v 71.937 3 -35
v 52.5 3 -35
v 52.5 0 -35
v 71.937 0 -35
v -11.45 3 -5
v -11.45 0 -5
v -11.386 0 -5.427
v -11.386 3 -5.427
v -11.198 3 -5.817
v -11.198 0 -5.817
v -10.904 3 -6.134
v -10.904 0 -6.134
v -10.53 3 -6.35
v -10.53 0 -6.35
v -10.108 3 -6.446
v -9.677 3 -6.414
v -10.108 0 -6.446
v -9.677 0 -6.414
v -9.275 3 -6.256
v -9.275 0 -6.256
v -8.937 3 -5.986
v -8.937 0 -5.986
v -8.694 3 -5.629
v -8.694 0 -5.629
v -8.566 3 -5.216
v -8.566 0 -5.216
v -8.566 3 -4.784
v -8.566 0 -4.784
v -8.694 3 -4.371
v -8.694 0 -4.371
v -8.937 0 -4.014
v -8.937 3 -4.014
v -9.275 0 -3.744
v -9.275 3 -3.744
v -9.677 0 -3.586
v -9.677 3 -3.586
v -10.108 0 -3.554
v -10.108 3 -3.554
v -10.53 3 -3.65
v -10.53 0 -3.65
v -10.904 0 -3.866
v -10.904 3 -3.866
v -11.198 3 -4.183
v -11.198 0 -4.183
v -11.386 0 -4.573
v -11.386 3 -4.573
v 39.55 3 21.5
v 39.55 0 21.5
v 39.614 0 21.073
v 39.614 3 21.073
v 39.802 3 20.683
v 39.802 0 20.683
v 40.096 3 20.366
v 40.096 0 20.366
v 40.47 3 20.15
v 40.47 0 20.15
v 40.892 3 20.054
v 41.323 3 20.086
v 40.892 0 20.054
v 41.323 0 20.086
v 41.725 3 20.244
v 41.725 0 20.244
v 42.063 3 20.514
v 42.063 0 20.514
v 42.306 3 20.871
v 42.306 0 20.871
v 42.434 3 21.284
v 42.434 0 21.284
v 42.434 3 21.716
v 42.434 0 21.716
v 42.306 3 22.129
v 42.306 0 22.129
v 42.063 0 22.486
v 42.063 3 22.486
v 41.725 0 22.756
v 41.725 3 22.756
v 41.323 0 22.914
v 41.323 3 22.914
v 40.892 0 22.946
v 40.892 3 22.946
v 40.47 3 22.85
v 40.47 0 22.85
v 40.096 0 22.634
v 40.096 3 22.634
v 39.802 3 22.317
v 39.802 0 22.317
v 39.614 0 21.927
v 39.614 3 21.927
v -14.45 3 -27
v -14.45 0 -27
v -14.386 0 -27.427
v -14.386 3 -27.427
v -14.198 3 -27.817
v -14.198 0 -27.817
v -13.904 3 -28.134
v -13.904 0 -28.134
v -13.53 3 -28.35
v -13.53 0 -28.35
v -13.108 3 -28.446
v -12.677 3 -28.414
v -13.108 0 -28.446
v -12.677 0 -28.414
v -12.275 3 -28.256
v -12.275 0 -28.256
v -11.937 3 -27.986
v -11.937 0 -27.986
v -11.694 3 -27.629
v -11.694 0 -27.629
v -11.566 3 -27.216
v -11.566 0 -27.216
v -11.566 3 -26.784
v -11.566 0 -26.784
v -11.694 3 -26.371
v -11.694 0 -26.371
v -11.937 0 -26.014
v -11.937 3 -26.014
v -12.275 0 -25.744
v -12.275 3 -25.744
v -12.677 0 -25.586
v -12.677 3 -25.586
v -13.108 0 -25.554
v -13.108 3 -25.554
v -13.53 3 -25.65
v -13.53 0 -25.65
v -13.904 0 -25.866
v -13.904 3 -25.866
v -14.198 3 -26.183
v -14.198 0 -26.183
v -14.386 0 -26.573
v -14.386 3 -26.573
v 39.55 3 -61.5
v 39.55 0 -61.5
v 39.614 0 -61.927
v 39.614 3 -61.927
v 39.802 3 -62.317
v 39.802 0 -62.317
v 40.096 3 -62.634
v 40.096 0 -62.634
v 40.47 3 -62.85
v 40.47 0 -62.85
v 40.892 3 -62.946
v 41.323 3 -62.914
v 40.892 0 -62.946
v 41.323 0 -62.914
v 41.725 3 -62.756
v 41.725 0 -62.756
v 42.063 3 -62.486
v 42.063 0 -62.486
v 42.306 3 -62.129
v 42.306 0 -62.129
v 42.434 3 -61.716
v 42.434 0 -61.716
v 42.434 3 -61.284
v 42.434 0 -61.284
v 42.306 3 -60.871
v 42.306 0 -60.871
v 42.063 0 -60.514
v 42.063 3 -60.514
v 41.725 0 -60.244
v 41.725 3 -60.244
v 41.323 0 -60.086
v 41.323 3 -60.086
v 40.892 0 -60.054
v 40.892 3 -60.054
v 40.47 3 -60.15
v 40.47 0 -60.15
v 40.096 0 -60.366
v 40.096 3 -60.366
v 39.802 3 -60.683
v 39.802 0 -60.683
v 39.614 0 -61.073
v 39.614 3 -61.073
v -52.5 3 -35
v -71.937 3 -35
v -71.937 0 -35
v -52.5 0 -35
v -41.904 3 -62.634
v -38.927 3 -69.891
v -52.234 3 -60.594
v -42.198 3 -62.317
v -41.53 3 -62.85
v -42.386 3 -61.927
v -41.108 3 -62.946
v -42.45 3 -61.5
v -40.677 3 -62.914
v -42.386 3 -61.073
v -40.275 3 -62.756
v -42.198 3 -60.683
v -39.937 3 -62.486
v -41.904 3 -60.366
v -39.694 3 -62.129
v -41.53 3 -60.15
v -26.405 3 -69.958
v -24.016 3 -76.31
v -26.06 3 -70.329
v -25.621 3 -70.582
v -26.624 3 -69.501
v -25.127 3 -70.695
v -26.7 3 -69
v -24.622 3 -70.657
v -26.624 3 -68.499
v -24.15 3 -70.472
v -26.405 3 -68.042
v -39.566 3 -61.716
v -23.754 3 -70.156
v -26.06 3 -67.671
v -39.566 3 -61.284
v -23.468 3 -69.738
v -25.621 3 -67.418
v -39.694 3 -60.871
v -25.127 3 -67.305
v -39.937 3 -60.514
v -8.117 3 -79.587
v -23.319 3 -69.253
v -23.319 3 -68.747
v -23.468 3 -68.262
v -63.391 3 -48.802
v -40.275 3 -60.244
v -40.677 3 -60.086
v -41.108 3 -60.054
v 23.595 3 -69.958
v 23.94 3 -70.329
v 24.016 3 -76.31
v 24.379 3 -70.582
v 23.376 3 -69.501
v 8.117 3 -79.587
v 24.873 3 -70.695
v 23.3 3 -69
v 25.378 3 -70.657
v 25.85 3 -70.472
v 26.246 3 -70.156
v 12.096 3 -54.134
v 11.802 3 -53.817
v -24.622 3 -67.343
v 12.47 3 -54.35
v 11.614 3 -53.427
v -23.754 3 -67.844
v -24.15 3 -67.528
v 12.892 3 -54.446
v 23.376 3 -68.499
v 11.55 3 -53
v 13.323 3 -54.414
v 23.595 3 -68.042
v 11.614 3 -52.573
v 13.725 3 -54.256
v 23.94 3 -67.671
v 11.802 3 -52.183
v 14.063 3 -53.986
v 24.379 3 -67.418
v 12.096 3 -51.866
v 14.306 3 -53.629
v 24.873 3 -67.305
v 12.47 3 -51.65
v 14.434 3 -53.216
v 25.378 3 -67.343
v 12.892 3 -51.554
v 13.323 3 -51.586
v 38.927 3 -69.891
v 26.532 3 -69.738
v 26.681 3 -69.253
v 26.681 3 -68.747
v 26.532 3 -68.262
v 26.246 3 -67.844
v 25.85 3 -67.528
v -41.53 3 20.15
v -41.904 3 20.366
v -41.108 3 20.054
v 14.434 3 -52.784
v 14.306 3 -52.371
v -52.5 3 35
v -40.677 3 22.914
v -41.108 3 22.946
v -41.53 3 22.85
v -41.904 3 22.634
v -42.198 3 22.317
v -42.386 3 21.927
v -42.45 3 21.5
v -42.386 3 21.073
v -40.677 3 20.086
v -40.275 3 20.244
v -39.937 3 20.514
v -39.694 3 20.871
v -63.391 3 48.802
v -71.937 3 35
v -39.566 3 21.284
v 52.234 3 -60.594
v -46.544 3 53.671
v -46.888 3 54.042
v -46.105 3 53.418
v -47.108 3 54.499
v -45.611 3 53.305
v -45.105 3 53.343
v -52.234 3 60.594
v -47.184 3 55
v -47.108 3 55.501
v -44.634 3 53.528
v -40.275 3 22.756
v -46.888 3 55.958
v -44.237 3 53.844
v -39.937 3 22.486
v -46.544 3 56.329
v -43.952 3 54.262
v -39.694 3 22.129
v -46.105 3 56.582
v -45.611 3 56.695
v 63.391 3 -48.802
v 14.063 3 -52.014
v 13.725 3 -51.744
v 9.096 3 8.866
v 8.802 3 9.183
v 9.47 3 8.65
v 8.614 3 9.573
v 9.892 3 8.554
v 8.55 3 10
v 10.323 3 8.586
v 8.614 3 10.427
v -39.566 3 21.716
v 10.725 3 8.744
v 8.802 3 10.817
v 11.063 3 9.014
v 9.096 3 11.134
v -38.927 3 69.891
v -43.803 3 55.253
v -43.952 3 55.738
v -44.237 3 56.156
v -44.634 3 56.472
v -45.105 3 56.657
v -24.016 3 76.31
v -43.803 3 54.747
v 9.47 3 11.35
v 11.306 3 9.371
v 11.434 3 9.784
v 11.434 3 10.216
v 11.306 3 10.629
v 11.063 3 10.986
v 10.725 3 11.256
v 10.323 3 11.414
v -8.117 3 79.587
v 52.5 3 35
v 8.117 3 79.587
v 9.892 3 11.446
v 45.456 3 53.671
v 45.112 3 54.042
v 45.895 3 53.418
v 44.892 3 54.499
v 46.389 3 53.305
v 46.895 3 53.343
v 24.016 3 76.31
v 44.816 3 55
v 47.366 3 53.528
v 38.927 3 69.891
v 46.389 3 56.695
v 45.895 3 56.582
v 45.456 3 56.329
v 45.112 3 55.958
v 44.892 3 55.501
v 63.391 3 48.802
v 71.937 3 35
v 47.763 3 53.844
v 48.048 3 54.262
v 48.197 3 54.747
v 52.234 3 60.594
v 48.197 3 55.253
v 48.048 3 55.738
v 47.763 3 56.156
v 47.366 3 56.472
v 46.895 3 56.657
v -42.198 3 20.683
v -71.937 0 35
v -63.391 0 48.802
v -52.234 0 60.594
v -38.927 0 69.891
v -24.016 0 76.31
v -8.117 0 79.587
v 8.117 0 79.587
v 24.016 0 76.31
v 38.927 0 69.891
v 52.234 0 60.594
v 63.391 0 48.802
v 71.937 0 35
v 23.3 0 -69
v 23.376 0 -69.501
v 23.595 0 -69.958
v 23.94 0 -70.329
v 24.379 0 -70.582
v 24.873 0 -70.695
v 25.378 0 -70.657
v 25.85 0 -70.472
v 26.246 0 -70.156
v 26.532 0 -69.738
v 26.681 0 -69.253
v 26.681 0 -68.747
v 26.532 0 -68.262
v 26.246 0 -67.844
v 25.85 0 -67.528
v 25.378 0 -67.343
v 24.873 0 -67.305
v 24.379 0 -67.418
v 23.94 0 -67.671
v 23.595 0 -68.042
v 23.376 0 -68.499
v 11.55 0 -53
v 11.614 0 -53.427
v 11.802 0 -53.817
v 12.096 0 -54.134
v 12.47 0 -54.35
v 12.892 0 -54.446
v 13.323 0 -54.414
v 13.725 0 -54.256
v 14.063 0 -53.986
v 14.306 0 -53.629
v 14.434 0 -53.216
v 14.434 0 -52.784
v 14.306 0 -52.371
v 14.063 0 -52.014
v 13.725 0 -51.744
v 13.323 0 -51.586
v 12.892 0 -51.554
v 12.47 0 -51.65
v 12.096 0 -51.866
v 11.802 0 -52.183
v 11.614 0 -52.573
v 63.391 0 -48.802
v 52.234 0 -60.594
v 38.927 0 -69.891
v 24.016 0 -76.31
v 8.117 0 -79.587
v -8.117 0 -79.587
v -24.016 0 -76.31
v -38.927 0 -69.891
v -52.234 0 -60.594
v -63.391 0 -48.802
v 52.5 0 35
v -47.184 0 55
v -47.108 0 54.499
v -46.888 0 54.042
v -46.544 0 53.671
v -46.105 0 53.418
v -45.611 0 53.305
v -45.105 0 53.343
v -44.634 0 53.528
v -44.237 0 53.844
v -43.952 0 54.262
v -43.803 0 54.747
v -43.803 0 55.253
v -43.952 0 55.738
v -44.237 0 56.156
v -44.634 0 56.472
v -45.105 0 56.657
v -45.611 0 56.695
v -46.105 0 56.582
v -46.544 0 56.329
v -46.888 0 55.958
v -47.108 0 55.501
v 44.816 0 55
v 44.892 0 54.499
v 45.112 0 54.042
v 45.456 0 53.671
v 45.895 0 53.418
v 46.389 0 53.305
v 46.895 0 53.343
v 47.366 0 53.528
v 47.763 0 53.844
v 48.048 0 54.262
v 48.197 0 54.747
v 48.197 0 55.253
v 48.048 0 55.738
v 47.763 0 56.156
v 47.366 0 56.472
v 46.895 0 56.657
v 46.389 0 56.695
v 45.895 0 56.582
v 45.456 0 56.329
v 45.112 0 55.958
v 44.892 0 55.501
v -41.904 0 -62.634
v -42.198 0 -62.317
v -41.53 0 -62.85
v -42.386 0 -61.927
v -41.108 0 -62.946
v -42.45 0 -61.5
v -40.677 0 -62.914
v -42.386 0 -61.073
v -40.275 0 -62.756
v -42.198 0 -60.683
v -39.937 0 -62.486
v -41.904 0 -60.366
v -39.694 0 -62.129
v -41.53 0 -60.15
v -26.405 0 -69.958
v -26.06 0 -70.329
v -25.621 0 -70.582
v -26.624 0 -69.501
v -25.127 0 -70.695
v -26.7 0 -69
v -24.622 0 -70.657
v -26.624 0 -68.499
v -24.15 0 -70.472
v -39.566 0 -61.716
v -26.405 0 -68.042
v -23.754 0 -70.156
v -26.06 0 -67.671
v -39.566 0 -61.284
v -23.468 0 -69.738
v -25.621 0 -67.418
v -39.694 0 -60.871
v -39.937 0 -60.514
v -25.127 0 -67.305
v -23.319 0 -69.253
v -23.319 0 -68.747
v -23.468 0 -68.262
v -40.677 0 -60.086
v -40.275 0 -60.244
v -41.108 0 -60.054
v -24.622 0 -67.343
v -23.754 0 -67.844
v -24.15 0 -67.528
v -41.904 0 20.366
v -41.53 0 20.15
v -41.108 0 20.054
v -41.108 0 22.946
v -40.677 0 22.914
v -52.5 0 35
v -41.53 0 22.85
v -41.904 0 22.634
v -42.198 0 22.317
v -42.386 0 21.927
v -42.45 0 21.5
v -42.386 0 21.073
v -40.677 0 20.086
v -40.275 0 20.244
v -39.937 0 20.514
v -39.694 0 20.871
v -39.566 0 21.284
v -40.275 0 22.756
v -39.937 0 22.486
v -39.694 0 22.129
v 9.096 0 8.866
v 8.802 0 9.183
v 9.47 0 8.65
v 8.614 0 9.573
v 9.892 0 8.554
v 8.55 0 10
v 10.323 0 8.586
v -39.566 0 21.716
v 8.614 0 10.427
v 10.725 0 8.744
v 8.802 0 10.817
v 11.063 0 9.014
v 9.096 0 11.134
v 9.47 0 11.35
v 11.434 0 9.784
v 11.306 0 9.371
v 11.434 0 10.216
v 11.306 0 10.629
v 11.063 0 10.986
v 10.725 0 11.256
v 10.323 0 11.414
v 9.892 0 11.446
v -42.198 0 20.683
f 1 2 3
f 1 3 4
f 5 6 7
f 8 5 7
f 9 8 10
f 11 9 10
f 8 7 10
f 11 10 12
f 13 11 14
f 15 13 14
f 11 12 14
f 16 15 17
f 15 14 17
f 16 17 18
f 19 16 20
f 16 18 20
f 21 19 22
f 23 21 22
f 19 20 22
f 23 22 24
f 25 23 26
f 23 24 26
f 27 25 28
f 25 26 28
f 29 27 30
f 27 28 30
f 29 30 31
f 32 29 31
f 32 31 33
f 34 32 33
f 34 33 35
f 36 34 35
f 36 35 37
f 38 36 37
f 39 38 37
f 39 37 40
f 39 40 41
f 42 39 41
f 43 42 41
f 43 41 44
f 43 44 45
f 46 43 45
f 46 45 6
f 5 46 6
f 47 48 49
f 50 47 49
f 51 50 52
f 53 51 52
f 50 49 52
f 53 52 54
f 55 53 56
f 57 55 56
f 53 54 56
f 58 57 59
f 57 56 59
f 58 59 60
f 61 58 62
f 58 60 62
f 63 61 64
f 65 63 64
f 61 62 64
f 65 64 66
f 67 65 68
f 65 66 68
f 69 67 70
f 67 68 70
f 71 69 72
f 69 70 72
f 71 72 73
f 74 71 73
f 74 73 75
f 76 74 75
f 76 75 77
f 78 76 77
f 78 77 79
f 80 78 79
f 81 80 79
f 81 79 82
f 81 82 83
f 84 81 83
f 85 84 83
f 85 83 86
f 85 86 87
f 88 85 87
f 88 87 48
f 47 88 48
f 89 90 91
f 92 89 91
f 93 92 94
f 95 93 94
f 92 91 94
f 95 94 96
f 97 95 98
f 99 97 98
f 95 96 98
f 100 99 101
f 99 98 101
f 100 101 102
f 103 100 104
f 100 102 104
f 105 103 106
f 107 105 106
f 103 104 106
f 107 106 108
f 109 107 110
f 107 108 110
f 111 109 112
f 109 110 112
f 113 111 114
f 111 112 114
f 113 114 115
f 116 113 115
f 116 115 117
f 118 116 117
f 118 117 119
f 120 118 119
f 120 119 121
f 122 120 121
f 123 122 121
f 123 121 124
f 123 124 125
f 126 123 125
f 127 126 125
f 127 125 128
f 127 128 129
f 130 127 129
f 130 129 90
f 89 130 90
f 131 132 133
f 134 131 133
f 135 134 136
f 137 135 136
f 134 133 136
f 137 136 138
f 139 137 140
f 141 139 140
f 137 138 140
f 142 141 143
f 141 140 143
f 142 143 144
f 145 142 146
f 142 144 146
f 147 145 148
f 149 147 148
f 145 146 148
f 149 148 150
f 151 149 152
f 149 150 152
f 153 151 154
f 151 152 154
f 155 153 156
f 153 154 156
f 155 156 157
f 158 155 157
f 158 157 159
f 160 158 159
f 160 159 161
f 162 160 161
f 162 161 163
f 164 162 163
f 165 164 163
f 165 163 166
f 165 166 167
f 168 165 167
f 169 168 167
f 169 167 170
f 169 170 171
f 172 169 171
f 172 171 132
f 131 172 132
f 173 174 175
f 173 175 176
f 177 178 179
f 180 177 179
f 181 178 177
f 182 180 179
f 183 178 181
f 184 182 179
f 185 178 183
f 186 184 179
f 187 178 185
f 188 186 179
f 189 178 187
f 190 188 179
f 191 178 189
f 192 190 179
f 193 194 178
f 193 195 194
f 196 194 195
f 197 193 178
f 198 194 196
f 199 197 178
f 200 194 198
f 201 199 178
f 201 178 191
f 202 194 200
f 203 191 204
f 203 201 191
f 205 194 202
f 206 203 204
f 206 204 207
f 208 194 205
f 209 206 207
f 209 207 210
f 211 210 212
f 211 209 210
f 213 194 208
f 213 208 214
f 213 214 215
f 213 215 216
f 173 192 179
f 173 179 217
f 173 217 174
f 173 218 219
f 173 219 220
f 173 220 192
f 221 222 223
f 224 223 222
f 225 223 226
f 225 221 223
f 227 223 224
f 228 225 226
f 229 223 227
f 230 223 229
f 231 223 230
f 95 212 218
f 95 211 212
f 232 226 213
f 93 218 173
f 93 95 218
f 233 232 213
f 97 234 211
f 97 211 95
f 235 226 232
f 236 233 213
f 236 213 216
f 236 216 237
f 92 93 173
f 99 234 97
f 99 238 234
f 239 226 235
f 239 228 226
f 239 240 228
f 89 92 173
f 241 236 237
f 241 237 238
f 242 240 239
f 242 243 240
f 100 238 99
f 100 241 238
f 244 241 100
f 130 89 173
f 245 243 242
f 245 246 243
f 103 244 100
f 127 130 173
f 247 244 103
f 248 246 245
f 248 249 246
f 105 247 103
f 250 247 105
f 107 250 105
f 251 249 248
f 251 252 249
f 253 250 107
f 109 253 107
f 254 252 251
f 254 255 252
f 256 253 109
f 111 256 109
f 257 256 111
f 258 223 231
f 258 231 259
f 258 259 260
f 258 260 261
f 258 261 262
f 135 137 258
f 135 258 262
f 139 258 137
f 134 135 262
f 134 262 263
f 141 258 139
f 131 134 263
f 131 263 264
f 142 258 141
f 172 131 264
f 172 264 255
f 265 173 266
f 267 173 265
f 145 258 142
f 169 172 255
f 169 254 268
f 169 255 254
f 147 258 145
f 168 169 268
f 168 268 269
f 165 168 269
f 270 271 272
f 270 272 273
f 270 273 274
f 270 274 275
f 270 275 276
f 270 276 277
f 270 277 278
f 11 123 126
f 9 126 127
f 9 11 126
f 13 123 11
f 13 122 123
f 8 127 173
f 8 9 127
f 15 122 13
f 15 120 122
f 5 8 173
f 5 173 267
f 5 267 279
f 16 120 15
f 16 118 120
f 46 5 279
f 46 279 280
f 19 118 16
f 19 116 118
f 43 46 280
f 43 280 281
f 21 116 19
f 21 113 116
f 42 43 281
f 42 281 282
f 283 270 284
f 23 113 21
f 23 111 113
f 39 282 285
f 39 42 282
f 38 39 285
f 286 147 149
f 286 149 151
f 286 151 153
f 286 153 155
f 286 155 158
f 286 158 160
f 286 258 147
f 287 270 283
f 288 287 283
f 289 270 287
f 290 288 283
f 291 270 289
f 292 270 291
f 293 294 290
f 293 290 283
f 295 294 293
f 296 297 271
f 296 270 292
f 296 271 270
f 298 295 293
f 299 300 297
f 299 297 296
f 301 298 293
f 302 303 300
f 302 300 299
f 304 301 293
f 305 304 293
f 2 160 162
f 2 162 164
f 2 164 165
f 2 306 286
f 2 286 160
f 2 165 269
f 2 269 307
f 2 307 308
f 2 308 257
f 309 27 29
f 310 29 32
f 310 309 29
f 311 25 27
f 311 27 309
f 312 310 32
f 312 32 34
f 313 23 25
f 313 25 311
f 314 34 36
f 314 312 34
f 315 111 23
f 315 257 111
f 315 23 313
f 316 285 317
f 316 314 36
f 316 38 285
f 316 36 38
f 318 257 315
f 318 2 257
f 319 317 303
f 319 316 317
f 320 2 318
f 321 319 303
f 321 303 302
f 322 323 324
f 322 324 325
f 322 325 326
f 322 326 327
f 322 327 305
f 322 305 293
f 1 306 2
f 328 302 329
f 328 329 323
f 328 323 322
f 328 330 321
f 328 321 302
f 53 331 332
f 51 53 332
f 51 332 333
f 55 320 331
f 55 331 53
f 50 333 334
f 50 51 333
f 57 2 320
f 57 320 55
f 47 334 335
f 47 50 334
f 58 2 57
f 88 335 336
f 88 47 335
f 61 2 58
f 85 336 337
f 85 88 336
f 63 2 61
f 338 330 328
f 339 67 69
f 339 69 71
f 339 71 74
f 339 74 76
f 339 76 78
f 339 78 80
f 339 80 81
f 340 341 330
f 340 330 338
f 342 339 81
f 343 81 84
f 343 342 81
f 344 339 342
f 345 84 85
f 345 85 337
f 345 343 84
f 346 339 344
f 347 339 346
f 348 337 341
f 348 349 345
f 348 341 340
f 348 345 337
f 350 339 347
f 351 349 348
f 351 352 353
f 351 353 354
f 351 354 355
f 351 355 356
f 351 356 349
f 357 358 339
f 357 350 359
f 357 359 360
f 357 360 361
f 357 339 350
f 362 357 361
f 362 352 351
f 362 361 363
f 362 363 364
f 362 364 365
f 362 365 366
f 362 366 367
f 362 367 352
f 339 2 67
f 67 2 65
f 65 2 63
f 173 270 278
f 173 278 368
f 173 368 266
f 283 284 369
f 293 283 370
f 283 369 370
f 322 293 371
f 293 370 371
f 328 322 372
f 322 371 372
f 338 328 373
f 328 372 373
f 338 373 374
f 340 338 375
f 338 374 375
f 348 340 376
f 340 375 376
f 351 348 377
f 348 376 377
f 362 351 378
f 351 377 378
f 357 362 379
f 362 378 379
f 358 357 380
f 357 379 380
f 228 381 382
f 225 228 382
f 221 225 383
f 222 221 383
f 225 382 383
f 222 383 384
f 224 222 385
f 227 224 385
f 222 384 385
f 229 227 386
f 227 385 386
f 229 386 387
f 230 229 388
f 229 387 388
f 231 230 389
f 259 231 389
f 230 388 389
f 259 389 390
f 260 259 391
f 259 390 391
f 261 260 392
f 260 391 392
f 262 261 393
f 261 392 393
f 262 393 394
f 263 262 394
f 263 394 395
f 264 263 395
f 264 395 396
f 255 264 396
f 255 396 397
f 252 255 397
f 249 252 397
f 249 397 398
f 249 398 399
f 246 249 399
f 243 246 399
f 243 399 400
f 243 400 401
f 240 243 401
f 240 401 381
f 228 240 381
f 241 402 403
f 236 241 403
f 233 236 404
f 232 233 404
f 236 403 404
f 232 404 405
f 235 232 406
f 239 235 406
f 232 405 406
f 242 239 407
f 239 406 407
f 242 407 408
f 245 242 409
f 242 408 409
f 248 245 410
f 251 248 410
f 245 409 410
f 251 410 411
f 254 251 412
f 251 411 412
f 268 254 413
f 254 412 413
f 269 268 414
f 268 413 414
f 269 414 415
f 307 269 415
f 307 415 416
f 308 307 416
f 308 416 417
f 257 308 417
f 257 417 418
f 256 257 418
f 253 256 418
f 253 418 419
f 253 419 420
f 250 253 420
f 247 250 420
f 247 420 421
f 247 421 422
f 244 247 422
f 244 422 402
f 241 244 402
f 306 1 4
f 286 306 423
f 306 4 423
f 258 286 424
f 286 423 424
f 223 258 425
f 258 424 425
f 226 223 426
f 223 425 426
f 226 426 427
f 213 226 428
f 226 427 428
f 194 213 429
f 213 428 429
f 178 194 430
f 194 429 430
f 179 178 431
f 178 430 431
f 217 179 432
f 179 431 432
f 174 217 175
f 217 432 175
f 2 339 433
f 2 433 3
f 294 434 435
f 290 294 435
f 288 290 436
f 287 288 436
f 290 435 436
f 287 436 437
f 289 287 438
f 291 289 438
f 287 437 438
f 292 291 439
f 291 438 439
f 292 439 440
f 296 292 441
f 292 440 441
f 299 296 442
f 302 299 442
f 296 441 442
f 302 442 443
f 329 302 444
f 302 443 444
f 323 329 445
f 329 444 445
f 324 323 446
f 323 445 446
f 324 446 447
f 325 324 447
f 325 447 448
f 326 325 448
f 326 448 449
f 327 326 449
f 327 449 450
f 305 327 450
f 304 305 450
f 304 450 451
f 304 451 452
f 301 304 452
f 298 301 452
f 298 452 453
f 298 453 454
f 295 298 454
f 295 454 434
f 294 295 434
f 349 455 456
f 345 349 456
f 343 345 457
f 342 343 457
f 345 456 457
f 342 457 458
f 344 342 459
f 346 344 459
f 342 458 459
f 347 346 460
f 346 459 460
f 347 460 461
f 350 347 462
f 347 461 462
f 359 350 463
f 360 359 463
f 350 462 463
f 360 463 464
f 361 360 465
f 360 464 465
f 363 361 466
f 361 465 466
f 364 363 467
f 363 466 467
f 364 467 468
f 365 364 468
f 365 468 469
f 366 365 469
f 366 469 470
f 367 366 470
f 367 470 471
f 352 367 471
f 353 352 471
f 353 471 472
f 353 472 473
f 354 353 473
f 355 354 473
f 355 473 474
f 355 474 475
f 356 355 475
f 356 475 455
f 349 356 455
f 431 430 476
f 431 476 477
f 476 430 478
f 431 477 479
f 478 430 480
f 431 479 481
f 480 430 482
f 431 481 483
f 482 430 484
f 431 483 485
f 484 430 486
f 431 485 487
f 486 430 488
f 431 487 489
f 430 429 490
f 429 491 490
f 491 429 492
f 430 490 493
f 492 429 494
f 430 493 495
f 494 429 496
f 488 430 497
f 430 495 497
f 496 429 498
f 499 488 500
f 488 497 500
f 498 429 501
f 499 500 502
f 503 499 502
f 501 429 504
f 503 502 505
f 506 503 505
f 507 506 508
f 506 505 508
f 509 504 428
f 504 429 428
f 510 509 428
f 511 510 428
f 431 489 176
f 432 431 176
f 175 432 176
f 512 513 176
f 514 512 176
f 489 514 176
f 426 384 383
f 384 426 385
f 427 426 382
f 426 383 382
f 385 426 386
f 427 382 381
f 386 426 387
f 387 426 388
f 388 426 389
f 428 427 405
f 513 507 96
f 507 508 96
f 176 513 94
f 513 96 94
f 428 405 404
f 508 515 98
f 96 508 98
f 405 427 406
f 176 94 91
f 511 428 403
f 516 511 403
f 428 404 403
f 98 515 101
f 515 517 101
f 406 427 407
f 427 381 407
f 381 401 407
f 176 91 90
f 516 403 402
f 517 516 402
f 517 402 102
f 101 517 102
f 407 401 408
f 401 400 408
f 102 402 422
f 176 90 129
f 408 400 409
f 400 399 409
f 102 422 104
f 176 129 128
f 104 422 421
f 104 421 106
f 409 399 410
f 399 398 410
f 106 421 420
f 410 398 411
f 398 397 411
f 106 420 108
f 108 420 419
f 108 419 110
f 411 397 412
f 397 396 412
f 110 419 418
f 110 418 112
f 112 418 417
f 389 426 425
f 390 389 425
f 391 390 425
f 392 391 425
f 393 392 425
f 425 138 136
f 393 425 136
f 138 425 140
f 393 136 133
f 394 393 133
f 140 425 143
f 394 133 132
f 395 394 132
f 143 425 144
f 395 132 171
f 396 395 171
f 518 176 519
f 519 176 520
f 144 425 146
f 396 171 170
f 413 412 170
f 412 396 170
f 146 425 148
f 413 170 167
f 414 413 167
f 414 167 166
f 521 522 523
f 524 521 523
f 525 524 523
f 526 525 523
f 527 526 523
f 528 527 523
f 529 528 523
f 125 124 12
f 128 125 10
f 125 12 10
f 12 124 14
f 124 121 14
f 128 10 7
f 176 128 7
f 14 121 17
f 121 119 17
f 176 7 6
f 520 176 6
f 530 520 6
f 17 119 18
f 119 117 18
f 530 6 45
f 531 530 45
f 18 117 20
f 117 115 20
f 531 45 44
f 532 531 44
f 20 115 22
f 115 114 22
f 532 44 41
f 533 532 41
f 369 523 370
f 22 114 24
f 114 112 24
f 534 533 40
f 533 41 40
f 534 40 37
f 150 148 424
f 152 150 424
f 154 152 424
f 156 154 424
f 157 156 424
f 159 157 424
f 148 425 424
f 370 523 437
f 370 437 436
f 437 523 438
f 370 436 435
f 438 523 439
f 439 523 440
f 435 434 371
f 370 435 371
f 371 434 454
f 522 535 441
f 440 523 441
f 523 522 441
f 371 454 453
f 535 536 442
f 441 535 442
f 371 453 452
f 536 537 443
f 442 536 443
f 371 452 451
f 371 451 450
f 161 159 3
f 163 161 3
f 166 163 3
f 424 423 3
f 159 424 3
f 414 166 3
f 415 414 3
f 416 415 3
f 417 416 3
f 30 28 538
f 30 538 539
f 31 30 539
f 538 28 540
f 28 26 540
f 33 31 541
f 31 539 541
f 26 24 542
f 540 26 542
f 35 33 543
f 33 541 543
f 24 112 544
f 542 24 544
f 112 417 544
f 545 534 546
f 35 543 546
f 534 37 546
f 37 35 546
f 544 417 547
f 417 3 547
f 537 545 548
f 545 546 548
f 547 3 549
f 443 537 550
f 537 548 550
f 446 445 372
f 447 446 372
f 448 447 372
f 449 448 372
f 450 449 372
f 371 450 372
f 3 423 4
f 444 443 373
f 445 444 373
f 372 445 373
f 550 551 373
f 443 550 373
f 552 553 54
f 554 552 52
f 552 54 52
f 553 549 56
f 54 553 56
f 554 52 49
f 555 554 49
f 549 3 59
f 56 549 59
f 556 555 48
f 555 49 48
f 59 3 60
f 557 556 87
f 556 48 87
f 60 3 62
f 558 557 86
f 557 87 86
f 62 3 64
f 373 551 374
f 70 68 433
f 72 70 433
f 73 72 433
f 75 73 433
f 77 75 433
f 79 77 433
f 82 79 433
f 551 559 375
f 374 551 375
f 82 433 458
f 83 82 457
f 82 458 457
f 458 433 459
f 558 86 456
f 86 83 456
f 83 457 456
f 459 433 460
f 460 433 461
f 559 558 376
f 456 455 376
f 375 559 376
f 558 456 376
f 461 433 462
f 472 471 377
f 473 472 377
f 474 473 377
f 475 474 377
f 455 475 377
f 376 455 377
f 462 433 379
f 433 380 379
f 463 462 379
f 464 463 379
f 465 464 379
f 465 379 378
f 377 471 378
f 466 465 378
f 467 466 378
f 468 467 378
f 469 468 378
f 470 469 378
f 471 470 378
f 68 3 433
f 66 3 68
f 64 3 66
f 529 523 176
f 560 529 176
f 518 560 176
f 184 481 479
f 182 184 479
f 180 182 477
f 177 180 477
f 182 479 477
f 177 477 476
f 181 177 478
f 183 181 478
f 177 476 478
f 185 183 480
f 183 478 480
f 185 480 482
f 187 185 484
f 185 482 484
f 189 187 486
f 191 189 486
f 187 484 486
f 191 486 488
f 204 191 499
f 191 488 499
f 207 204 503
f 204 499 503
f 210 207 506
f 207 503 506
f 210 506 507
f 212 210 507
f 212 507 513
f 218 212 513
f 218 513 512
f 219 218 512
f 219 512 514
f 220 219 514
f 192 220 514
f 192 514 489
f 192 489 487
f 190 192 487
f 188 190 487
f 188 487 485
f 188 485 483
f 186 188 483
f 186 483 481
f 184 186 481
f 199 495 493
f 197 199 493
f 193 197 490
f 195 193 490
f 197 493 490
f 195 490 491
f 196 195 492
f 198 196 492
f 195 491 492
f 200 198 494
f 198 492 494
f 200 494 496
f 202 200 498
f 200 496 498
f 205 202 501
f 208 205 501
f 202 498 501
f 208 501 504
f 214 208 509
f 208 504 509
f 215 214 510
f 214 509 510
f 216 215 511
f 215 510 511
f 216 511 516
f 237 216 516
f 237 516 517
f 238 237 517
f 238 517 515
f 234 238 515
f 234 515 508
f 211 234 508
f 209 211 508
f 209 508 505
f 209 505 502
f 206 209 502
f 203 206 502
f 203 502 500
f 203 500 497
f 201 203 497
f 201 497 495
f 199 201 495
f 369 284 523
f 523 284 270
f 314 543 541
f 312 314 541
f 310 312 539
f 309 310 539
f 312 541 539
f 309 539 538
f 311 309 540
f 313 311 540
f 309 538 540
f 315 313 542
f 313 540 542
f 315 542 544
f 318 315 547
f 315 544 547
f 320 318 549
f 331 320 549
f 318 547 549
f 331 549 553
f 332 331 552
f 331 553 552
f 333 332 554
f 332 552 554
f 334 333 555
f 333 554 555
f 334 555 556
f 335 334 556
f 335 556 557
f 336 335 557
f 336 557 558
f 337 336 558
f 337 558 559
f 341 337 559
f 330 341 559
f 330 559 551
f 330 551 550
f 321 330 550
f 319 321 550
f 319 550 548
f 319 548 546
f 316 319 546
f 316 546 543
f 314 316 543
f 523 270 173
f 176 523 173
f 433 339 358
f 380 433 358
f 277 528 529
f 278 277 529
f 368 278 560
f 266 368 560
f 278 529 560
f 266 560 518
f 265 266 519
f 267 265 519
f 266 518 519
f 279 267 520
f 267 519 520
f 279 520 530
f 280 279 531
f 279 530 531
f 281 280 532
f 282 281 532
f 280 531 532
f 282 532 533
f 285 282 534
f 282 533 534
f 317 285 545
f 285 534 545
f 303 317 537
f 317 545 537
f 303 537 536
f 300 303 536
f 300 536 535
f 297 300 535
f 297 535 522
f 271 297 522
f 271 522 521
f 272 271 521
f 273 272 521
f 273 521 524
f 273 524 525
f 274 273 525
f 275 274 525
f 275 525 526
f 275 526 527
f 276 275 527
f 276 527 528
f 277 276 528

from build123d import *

# Parameters (mm, degrees)
ESQUISSE1_R             = 80
BOSS_EXTRU_1_DEPTH      = 3
ESQUISSE2_W             = 55
ESQUISSE2_H             = 70
ENL_V_MAT_EXTRU_1_DEPTH = 114.176852757
D_GAGEMENT_M2_51_D      = 2.9
D_GAGEMENT_M2_51_DEPTH  = 24
D_GAGEMENT_M2_51_TIP    = 0.871247898
D_GAGEMENT_M2_52_D      = 2.9
D_GAGEMENT_M2_52_DEPTH  = 24
D_GAGEMENT_M2_52_TIP    = 0.871247898
D_GAGEMENT_M31_D        = 3.4
D_GAGEMENT_M31_DEPTH    = 24
D_GAGEMENT_M31_TIP      = 1.021463052


with BuildPart() as part:
    # Esquisse1 → Boss.-Extru.1 (new body)
    with BuildSketch(Plane(origin=(0, 0, 0), x_dir=(1, 0, 0), z_dir=(0, 1, 0))):
        with Locations(Location((0, 0, 0), (0, 0, 270))):
            Circle(ESQUISSE1_R)
    extrude(amount=BOSS_EXTRU_1_DEPTH)

    # Esquisse2 → Enlèv. mat.-Extru.1 (cut, through all)
    with BuildSketch(Plane(origin=(0, 3, 0), x_dir=(1, 0, 0), z_dir=(0, 1, 0))):
        with Locations((-80, 0)):
            Rectangle(ESQUISSE2_W, ESQUISSE2_H)
        with Locations((80, 0)):
            Rectangle(ESQUISSE2_W, ESQUISSE2_H)
    extrude(amount=-ENL_V_MAT_EXTRU_1_DEPTH, mode=Mode.SUBTRACT)

    # Dégagement M2.51
    with Locations(Plane(origin=(0, 3, 0), x_dir=(1, 0, 0), z_dir=(0, 1, 0))):
        with Locations((-41, 61.5), (-41, -21.5), (41, -21.5), (41, 61.5)):
            Hole(D_GAGEMENT_M2_51_D / 2, depth=D_GAGEMENT_M2_51_DEPTH)
            with Locations((0, 0, -(D_GAGEMENT_M2_51_DEPTH + D_GAGEMENT_M2_51_TIP / 2))):  # 118° drill point
                Cone(0, D_GAGEMENT_M2_51_D / 2, D_GAGEMENT_M2_51_TIP, mode=Mode.SUBTRACT)

    # Dégagement M2.52
    with Locations(Plane(origin=(0, 3, 0), x_dir=(1, 0, 0), z_dir=(0, 1, 0))):
        with Locations((-13, 27), (13, 53), (-10, 5), (10, -10)):
            Hole(D_GAGEMENT_M2_52_D / 2, depth=D_GAGEMENT_M2_52_DEPTH)
            with Locations((0, 0, -(D_GAGEMENT_M2_52_DEPTH + D_GAGEMENT_M2_52_TIP / 2))):  # 118° drill point
                Cone(0, D_GAGEMENT_M2_52_D / 2, D_GAGEMENT_M2_52_TIP, mode=Mode.SUBTRACT)

    # Dégagement M31
    with Locations(Plane(origin=(0, 3, 0), x_dir=(1, 0, 0), z_dir=(0, 1, 0))):
        with Locations((-45.483572208, -55), (46.516427792, -55), (-25, 69), (25, 69)):
            Hole(D_GAGEMENT_M31_D / 2, depth=D_GAGEMENT_M31_DEPTH)
            with Locations((0, 0, -(D_GAGEMENT_M31_DEPTH + D_GAGEMENT_M31_TIP / 2))):  # 118° drill point
                Cone(0, D_GAGEMENT_M31_D / 2, D_GAGEMENT_M31_TIP, mode=Mode.SUBTRACT)


solid = part.part
